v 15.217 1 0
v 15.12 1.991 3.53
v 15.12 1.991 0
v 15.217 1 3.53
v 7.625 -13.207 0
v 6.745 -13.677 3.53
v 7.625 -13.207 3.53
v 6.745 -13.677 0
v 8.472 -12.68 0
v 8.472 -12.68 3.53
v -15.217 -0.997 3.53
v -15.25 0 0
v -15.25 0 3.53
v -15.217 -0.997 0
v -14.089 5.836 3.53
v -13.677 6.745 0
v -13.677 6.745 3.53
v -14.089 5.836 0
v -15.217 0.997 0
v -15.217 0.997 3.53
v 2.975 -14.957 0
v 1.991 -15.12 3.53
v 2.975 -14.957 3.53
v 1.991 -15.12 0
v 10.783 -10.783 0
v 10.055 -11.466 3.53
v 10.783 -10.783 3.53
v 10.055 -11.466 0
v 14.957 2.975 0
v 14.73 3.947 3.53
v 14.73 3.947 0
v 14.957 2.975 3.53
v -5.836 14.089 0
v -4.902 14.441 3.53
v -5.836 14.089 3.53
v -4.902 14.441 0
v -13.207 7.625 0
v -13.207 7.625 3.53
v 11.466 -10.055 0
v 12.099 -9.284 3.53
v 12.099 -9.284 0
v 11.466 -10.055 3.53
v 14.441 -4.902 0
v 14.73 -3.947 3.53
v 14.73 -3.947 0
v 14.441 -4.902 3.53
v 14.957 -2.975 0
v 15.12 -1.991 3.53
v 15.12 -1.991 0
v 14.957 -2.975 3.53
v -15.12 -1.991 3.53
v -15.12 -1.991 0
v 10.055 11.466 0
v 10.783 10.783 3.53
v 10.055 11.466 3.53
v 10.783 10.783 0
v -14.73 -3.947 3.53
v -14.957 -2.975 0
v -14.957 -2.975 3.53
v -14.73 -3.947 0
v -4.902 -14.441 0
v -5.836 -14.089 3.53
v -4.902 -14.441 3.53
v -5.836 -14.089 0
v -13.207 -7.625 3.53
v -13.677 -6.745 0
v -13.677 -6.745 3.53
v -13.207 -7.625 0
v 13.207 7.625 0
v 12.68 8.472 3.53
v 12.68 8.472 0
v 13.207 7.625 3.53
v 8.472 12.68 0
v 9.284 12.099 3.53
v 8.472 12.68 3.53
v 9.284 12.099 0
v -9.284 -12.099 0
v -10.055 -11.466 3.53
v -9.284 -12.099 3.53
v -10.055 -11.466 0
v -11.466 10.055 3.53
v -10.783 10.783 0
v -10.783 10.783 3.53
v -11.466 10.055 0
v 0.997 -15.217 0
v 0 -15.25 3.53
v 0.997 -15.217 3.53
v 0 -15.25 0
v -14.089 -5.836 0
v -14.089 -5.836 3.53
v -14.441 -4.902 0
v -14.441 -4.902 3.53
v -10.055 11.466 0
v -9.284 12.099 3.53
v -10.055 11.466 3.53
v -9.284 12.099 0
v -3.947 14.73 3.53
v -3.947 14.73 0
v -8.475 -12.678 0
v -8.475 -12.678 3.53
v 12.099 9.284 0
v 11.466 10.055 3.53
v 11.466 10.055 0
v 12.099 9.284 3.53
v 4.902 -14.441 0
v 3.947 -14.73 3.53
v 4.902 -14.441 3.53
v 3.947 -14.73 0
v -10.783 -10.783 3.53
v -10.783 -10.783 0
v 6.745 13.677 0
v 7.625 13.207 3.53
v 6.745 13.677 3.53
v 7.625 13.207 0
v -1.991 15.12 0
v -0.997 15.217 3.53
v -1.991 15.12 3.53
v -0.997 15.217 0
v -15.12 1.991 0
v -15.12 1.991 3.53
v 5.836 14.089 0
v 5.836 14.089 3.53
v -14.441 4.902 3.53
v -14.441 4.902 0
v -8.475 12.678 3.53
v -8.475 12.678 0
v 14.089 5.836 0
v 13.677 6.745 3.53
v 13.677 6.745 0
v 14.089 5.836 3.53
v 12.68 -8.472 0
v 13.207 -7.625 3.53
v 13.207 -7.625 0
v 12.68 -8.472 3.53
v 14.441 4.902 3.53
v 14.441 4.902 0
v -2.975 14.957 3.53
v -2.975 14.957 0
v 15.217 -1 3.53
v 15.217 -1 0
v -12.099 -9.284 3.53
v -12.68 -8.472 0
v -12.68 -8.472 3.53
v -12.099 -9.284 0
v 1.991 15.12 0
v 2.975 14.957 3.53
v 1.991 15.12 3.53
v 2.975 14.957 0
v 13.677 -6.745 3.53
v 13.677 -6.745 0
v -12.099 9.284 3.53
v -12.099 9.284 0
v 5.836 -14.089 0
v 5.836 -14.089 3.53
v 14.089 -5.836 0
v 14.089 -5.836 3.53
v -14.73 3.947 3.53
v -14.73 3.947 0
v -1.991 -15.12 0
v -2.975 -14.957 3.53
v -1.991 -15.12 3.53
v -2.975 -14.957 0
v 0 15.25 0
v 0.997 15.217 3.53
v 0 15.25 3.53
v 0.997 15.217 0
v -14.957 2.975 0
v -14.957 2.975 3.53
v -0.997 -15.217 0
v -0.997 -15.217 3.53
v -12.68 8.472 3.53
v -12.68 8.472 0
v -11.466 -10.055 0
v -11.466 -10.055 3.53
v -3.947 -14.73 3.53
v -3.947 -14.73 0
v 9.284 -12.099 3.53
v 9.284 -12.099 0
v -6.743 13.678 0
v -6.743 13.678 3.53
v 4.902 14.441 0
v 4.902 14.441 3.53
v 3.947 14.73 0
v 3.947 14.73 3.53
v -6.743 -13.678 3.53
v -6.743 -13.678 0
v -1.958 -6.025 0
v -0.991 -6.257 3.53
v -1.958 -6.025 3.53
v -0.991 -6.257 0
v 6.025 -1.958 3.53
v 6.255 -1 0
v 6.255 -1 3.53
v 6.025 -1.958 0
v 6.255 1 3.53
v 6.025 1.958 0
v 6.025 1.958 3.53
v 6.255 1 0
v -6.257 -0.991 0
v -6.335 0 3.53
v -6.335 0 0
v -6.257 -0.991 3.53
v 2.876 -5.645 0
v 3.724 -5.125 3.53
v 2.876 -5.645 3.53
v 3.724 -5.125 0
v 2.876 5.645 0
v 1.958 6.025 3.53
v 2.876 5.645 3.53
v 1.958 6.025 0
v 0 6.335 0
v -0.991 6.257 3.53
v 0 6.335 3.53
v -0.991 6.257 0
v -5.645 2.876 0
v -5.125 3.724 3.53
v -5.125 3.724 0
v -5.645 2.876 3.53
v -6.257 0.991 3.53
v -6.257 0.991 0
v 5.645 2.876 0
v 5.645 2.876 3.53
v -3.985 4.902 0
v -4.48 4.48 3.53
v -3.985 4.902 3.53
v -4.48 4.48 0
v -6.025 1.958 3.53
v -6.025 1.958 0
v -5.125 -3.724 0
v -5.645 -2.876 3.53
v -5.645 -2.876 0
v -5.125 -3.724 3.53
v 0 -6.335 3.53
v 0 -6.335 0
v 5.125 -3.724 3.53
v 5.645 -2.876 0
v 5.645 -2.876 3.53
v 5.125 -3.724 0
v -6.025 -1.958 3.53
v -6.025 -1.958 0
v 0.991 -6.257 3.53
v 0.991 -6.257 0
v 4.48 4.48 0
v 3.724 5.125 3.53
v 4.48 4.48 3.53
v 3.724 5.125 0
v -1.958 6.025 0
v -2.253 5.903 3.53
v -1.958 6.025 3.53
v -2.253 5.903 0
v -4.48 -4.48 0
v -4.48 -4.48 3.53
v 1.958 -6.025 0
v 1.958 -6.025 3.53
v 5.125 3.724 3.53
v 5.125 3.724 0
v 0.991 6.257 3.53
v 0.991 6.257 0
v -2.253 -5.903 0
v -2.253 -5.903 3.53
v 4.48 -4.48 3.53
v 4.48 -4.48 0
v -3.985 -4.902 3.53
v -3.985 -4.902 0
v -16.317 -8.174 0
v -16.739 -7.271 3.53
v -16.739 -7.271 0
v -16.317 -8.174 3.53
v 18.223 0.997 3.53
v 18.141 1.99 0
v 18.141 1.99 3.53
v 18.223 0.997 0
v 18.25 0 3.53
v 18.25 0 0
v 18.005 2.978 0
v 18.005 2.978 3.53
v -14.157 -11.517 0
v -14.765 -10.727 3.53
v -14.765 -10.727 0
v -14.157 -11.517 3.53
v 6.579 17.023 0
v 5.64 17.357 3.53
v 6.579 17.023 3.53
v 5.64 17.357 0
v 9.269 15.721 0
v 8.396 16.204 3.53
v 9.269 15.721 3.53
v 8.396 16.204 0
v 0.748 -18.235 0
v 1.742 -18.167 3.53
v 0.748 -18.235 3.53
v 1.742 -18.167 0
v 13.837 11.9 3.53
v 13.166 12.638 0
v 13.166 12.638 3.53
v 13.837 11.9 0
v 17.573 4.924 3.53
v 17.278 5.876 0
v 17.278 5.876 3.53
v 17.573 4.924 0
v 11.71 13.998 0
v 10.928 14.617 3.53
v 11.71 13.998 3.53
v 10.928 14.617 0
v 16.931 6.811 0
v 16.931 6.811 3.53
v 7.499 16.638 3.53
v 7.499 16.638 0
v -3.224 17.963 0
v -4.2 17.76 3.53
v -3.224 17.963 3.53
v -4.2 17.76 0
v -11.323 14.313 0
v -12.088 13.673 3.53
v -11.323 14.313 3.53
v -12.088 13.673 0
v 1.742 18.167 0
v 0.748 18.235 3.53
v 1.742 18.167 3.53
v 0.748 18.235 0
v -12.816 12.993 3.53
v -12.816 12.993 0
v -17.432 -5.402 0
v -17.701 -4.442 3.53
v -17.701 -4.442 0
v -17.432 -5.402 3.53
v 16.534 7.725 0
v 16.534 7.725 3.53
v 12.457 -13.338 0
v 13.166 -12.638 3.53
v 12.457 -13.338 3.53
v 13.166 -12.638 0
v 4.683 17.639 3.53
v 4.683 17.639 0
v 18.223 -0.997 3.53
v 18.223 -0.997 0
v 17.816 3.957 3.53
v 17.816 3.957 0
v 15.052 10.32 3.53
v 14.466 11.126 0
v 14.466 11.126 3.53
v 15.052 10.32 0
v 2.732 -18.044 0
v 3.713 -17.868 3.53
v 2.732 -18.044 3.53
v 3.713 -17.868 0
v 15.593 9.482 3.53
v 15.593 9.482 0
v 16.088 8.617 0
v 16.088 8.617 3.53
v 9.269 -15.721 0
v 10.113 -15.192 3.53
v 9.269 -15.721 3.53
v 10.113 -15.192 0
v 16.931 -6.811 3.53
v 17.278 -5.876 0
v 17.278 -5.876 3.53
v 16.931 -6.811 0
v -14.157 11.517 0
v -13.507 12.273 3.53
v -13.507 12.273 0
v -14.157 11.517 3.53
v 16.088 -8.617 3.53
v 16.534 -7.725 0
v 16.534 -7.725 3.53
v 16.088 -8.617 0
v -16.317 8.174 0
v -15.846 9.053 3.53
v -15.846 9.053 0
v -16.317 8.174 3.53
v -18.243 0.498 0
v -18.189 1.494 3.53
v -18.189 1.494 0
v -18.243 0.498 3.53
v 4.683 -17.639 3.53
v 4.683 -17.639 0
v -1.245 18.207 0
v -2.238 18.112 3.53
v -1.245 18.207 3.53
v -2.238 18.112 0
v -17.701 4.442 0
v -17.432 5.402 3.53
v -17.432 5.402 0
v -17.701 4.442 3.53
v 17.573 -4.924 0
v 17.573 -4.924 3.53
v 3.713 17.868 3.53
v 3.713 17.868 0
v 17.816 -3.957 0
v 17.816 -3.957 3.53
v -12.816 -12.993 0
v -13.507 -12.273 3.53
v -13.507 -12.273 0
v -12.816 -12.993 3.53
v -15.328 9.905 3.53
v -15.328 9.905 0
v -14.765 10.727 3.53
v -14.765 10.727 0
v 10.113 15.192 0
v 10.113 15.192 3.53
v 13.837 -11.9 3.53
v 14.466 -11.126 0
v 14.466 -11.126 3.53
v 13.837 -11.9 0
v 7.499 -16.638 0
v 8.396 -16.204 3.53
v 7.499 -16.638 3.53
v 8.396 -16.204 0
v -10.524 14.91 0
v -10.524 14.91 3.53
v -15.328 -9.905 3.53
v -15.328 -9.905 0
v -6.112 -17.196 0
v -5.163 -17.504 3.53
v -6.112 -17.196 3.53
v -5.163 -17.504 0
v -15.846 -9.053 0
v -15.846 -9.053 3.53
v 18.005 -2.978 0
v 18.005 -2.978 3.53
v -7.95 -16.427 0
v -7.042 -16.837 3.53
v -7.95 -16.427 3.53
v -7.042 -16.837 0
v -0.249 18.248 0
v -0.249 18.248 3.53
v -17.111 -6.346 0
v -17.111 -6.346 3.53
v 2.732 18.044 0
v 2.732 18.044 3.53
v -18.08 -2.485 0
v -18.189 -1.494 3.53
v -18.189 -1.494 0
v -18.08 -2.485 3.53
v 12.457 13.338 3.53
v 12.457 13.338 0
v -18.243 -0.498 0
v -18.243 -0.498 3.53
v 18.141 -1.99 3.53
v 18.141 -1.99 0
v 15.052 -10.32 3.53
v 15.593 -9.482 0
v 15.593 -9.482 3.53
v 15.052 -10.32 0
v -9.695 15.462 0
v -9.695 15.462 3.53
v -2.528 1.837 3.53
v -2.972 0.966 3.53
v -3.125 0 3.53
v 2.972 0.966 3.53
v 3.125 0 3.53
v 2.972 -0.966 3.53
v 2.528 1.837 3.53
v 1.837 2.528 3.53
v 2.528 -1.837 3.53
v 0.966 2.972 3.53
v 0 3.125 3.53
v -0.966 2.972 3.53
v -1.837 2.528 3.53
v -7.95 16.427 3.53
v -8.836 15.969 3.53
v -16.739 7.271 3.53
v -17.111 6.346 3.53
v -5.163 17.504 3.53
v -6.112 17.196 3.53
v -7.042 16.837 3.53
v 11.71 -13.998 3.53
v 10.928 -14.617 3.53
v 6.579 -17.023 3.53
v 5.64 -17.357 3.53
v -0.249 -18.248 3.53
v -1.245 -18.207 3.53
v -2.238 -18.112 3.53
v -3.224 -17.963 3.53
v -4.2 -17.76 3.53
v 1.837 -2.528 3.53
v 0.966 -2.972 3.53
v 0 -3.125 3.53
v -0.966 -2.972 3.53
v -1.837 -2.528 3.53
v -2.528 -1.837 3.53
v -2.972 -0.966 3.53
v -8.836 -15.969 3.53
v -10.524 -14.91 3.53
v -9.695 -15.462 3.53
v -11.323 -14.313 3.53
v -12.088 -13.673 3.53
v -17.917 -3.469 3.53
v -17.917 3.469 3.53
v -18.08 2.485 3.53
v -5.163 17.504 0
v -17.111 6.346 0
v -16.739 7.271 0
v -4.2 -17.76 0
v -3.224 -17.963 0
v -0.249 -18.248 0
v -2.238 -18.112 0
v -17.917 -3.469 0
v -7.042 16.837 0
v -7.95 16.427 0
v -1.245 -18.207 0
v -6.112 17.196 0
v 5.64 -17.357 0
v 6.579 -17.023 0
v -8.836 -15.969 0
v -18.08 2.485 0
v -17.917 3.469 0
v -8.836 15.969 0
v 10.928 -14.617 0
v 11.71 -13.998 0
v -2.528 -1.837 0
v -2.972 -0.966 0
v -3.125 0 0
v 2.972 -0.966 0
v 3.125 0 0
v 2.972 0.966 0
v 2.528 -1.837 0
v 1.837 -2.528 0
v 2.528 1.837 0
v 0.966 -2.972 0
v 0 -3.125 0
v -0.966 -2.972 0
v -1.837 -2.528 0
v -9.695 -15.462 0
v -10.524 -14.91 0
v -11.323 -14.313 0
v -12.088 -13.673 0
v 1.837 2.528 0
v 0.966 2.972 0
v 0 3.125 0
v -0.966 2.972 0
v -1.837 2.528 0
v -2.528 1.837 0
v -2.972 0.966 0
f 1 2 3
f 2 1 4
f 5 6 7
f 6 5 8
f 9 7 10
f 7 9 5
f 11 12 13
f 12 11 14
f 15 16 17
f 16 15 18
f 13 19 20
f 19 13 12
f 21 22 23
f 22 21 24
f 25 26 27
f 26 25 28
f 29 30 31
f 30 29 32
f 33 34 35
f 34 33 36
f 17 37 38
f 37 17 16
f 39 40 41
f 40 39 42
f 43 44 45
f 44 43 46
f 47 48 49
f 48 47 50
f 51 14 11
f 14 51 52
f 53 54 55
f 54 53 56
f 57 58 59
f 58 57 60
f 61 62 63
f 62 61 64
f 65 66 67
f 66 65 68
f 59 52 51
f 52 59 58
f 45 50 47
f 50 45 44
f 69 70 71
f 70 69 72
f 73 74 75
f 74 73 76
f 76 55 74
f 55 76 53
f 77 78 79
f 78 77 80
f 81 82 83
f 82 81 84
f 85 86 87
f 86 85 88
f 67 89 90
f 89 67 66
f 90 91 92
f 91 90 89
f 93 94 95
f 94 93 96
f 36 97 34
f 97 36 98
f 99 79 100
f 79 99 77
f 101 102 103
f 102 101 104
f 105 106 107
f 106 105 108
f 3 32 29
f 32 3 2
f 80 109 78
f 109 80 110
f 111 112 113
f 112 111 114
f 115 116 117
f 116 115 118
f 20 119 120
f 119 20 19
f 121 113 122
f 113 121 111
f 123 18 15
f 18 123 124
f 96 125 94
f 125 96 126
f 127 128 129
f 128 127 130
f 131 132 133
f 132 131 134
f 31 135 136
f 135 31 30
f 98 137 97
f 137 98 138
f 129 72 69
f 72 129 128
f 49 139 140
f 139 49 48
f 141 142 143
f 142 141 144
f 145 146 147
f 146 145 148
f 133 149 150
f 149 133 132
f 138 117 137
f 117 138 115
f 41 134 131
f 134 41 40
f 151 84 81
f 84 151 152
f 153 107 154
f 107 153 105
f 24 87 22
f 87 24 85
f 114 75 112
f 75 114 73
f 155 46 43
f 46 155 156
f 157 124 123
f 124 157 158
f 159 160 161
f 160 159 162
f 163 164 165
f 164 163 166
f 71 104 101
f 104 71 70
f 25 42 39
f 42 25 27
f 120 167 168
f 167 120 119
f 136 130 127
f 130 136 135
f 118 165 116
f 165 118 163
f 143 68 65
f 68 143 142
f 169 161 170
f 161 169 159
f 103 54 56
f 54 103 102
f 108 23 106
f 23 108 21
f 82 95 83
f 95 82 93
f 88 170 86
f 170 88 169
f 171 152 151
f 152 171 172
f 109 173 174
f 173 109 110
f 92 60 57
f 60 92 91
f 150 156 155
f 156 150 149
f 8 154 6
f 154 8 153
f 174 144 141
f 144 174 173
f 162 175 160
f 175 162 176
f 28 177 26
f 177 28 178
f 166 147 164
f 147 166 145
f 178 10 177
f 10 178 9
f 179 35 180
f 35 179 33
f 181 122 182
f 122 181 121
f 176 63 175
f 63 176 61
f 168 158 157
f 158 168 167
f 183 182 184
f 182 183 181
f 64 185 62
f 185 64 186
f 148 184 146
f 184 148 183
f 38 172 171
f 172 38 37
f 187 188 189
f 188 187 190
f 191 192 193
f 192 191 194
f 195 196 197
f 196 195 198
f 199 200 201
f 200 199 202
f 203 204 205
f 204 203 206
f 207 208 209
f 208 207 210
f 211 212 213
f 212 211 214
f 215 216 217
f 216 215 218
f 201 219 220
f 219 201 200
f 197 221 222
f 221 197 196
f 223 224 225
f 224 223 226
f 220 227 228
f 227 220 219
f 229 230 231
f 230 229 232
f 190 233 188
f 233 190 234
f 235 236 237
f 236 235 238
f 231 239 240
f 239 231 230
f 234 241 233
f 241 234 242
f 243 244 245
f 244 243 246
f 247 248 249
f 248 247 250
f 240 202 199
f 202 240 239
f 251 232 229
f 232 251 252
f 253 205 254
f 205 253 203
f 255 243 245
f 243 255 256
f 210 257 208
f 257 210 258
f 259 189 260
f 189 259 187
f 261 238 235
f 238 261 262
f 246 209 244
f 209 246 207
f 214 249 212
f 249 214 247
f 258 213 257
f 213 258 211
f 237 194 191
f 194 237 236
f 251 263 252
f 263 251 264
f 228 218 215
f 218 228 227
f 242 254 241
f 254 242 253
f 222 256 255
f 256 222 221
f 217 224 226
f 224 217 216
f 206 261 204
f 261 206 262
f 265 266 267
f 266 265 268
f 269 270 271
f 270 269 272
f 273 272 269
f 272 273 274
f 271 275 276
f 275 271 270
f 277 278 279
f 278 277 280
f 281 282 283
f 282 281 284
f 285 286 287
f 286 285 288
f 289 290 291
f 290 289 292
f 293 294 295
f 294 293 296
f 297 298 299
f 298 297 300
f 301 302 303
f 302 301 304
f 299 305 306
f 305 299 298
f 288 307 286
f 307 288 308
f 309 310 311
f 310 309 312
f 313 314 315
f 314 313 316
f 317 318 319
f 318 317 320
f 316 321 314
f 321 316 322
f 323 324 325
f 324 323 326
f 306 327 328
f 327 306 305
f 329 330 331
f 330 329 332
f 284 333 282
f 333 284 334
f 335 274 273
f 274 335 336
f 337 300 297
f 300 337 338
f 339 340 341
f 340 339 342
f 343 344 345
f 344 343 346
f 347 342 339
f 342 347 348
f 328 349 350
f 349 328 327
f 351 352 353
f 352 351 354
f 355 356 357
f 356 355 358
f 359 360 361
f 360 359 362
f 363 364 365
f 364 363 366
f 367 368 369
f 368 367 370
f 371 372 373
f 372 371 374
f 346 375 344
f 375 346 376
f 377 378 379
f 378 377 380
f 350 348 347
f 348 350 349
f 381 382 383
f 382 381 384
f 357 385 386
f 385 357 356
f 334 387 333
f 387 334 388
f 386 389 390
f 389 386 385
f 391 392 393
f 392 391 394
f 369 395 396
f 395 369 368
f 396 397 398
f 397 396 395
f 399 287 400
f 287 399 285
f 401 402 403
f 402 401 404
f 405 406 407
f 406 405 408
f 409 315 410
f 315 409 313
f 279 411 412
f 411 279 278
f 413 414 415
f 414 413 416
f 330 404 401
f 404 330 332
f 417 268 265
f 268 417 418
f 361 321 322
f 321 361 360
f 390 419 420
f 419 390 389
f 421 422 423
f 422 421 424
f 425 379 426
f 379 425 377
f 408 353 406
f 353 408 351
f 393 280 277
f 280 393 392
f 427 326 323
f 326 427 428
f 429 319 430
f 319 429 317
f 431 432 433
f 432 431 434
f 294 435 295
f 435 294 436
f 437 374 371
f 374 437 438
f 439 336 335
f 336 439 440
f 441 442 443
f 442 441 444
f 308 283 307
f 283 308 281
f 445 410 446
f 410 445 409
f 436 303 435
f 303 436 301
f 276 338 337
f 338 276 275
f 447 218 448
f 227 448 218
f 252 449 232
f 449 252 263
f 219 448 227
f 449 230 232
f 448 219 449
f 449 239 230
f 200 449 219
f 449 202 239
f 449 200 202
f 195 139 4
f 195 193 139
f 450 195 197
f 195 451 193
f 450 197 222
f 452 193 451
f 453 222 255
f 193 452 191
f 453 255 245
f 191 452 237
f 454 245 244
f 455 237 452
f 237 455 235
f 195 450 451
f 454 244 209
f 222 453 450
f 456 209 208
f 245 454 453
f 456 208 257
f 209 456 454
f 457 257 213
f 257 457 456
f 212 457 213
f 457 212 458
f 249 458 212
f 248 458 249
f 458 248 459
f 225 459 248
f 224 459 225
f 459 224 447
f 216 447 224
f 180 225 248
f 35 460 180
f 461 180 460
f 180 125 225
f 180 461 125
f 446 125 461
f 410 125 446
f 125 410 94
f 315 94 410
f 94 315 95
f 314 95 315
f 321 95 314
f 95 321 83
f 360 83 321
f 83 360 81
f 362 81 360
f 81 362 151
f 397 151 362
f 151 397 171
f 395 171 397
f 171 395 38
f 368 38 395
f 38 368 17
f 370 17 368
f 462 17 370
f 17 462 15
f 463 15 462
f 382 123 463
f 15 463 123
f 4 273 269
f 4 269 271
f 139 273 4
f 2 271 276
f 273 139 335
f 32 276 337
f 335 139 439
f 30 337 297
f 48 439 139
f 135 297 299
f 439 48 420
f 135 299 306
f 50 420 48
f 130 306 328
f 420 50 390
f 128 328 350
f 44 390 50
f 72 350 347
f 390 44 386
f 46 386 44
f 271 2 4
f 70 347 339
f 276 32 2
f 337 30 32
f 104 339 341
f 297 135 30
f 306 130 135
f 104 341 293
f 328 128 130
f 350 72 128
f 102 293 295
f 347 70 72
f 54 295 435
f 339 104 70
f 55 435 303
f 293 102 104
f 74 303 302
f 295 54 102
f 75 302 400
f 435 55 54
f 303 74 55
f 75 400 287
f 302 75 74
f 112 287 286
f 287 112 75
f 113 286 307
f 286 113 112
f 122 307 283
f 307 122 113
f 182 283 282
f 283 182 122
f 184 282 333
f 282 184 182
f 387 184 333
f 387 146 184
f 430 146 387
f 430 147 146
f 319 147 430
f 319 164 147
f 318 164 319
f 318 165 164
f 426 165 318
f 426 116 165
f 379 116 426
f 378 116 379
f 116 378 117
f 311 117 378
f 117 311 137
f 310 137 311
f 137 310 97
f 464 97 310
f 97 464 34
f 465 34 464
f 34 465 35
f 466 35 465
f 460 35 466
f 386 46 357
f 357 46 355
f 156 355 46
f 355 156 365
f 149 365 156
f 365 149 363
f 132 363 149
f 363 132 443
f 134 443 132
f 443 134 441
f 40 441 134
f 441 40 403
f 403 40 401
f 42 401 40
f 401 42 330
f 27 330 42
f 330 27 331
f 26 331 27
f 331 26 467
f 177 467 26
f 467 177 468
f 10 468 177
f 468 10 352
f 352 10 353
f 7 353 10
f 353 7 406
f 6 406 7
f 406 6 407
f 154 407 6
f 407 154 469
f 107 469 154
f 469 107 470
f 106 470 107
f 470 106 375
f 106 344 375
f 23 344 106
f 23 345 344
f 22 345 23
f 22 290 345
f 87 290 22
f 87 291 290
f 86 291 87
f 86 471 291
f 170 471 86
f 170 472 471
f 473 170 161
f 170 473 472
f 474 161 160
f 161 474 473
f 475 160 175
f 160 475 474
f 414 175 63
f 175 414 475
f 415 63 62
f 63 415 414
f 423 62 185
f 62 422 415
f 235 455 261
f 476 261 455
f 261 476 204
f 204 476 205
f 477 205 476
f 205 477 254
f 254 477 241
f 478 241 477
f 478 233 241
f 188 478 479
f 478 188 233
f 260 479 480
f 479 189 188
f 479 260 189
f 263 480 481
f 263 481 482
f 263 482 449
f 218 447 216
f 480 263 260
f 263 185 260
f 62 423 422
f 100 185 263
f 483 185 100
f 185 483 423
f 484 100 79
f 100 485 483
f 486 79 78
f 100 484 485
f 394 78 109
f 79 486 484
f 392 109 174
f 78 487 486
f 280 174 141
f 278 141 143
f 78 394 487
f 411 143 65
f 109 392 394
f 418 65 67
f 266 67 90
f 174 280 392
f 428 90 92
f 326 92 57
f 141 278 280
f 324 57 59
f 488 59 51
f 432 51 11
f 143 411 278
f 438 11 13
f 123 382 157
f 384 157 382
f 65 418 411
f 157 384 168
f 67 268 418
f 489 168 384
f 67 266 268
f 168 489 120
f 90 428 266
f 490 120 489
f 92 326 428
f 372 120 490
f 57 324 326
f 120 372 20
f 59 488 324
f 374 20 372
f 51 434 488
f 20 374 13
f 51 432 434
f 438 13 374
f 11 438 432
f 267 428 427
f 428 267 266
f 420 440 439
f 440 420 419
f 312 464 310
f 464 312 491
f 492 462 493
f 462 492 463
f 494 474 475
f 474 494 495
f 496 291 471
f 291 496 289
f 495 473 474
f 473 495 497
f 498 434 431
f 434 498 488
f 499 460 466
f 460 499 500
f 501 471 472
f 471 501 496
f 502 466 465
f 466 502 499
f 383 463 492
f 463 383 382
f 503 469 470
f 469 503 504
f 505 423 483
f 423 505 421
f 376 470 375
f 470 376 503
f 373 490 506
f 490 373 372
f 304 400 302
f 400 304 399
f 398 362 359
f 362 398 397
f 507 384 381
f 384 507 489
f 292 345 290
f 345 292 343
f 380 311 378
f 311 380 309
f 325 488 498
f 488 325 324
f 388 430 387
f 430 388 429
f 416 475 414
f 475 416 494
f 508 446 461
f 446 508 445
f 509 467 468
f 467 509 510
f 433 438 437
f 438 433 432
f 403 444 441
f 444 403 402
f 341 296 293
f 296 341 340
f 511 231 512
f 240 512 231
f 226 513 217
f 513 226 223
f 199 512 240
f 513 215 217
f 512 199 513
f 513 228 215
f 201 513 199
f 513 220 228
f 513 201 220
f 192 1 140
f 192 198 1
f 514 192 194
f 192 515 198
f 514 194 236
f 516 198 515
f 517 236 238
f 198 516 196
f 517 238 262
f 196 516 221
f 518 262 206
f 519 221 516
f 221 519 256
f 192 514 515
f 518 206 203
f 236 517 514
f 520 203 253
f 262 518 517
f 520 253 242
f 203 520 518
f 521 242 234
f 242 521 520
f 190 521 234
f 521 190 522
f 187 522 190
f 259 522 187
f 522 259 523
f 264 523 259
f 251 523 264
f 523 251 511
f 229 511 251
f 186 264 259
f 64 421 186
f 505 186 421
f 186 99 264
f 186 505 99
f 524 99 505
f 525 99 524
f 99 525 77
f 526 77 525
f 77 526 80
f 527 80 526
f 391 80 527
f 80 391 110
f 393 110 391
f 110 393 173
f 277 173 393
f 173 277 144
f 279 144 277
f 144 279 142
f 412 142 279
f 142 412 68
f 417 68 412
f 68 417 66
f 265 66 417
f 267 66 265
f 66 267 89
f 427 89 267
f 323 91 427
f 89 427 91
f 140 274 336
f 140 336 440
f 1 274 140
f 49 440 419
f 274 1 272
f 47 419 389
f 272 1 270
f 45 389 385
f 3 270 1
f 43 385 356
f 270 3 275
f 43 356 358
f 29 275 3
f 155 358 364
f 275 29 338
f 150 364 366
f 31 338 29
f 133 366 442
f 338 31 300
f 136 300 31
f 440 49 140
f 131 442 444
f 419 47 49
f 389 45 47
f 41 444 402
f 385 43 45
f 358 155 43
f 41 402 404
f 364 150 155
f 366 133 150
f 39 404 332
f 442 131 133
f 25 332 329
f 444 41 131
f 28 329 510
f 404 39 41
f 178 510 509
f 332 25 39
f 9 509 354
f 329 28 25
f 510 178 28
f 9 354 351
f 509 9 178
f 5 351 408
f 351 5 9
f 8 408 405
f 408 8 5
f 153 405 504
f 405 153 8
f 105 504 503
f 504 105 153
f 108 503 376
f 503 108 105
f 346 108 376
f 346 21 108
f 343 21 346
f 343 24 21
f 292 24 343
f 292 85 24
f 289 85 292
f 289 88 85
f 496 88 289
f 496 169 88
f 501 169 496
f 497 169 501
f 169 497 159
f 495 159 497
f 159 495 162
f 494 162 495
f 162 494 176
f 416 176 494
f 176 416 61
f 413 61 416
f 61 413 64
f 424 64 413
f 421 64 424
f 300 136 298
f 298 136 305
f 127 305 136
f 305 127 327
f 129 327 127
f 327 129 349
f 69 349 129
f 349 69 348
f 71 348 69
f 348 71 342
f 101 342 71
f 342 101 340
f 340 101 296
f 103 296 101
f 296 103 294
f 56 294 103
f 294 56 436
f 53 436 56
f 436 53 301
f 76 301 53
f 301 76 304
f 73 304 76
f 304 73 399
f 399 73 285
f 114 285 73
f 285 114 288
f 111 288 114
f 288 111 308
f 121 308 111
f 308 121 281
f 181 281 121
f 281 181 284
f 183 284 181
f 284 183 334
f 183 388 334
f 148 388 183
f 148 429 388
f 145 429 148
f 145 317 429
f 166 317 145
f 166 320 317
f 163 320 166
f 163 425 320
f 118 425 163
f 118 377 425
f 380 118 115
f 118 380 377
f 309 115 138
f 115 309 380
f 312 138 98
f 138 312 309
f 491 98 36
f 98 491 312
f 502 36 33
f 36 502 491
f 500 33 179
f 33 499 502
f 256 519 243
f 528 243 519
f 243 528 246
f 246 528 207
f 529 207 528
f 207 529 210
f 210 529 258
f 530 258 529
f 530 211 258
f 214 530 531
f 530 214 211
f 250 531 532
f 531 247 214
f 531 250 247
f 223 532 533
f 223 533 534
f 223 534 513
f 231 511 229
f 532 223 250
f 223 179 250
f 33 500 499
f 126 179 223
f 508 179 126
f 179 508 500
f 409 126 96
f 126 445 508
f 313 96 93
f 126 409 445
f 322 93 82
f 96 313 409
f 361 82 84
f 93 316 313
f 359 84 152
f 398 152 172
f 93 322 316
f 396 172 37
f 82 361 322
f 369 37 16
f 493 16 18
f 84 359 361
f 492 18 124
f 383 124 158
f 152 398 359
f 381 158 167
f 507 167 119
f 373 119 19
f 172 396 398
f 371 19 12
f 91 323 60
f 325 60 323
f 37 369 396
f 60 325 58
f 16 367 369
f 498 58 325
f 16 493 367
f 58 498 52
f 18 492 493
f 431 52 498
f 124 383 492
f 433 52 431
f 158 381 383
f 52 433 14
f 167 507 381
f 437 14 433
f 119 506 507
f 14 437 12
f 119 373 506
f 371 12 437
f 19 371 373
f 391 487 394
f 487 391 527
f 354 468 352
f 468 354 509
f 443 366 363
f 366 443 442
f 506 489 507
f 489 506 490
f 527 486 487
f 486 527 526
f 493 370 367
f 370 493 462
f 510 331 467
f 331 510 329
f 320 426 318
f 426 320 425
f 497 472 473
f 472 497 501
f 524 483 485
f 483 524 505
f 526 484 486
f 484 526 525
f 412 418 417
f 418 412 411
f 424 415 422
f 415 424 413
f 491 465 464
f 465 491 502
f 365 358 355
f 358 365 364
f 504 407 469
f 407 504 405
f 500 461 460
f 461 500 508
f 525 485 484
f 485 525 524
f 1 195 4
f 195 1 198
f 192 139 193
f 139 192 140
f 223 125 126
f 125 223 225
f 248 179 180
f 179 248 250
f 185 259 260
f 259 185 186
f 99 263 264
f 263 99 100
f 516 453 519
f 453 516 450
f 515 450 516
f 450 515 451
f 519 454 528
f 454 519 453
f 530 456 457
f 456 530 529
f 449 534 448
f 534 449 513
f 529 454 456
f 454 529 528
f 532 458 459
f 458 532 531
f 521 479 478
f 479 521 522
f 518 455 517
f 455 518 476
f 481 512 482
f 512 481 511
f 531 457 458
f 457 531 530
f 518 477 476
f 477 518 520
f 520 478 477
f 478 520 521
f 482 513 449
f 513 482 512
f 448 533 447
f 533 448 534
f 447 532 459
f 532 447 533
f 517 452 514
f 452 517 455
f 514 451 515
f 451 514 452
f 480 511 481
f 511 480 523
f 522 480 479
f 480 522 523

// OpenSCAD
// M-94 Cipher Device Model
//
// Version 0.2
// All dimensions in mm.
// by Mike Koss, 2013
// License: CC-Attribution.

use <write.scad>

// When true - copies details from the authentic M-94
REPLICA = false;
WHEEL = 17;

// Epsilon - to ensure walls not coincident
E = 0.01;

wheels = ["ABCEIGDJFVUYMHTQKZOLRXSPWN",
          "ACDEHFIJKTLMOUVYGZNPQXRWSB",
          "ADKOMJUBGEPHSCZINXFYQRTVWL",
          "AEDCBIFGJHLKMRUOQVPTNWYXZS",
          "AFNQUKDOPITJBRHCYSLWEMZVXG",
          "AGPOCIXLURNDYZHWBJSQFKVMET",
          "AHXJEZBNIKPVROGSYDULCFMQTW",
          "AIHPJOBWKCVFZLQERYNSUMGTDX",
          "AJDSKQOIVTZEFHGYUNLPMBXWCR",
          "AKELBDFJGHONMTPRQSVZUXYWIC",
          "ALTMSXVQPNOHUWDIZYCGKRFBEJ",
          "AMNFLHQGCUJTBYPZKXISRDVEWO",
          "ANCJILDHBMKGXUZTSWQYVORPFE",
          "AODWPKJVIUQHZCTXBLEGNYRSMF",
          "APBVHIYKSGUENTCXOWFQDRLJZM",
          "AQJNUBTGIMWZRVLXCSHDEOKFPY",
          "ARMYOFTHEUSZJXDPCWGQIBKLNV",
          "ASDMCNEQBOZPLGVJRKYTFUIWXH",
          "ATOJYLFXNGWHVCMIRBSEKUPDZQ",
          "AUTRZXQLYIOVBPESNHJWMDGFCK",
          "AVNKHRGOXEYBFSJMUDQCLZWTIP",
          "AWVSFDLIEBHKNRJQZGMXPUCOTY",
          "AXKWREVDTUFOYHMLSIQNJCPGBZ",
          "AYJPXMVKBQWUGLOSTECHNZFRID",
          "AZDNBUHYFWJLVGRCQMPSOEXTKI"
         ];

// Disk dimensions
OD = 36.5;
WALL_WIDTH = REPLICA ? 1.0 : 3.0;
R_O = OD / 2;
R_I = R_O - WALL_WIDTH;
H = 3.53;
T = 1.0;

LETTER_SIZE = 3.75;
LETTER_SHIFT = -0.10;

// Axle dimensions
A = 6.15;
ID_A = A + 0.1;
OD_A = 12.67;
R_A = OD_A / 2;

// Sprocket dimensions
R_S = R_O - 1.0;
R_S2 = R_S - 2.8;
R_S3 = R_S - 5.2;
H_S = 1.0;

// Sprocket and peg width
W_S = 2.46;
W_P = 1.00;
L_P = 2.00;
H_P = H - 0.5;

// Alignment bar dimensions
B_W = 6.5;
B_H = 4.4;
B_H2 = 2.3;

// M-94 has a set of interlocking sprockets that engage a peg on the
// underside of the wheel to the left.
module sprockets() {
  union() {
    // Ring
    difference() {
      cylinder(h=H_S, r=R_S2, $fa=1, $fs=1);
      translate([0, 0, -H_S/2])
        cylinder(h=H_S * 2, r1=R_S3 - 1.0, r2=R_S3, $fa=1, $fs=1);
    }

    // Sprockets
    for (i = [0 : 25]) {
      rotate(a=360 * i / 26, v=[0, 0, 1])
        translate([R_S3, -W_S / 2, 0])
        cube([R_S - R_S3, W_S, H_S]);
    }

    // Peg
    rotate(a=360/26/2, v=[0, 0, 1])
      translate([R_I - L_P, -W_P / 2, -H_P])
      cube([L_P, W_P, H_P]);
  }
}

module spokes(n) {
  for (i = [0 : n -1]) {
    rotate(a=360 * i / n, v=[0, 0, 1])
      translate([R_A - 1, -1, 0])
      cube([R_I - R_A + 2, 2, H]);
  }
}

module basicDisk() {
  difference() {
    cylinder(h=H, r=R_O, $fa=1, $fs=1);

    if (REPLICA) {
      translate([0, 0, -T]) difference () {
        cylinder(h=H, r=R_I, $fa=1, $fs=1);
        cylinder(h=H, r=R_A, $fa=1, $fs=1);
      }
    } else {
      translate([0, 0, -H/2]) scale([1, 1, 2]) difference () {
        cylinder(h=H, r=R_I, $fa=1, $fs=1);
        cylinder(h=H, r=R_A, $fa=1, $fs=1);
      }
    }
  }
  if (!REPLICA) {
    spokes(3);
  }
}

module disk(letters) {
  union() {
    difference() {
      basicDisk();

      // Axle hole
      translate([0, 0, -H/2]) scale([1, 1, 2])
        cylinder(h=H, r=ID_A / 2, $fa=1, $fs=1);

      // Etched letters
      alpha(letters);
    }

    translate([0, 0, H])
      if (REPLICA) {
        sprockets();
      }
  }
}

module alpha(letters) {
  for (i = [0 : len(letters) - 1]) {
    rotate(a=360 * (1 - i / 26), v=[0, 0, 1])
      translate([R_I + WALL_WIDTH / 2 + 1.0, 0, H / 2 + LETTER_SHIFT])
      rotate(a=90, v=[0, 1, 0])
      write(letters[i], h=LETTER_SIZE, t=WALL_WIDTH, center=true, font="Letters.dxf");
  }
}

// Wheel 1 through 25
module wheel(i) {
  if (i == 0) {
    bar();
  } else {
    disk(wheels[i - 1]);
  }
}

// Alignment bar
module bar() {
  disk("");
  translate([R_O - .25, 0, H])
    rotate(a=90, v=[0, 1, 0])
    difference() {
      polyhedron(
        points=[ [0, -B_W / 2, 0], [0, 0, B_H], [0, B_W / 2, 0],
                 [26 * H, -B_W / 2, 0], [26 * H, 0, B_H2], [26 * H, B_W / 2, 0]
               ],
        triangles=[ [0, 2, 1],
                    [0, 1, 4], [4, 3, 0],
                    [3, 4, 5],
                    [5, 4, 1], [1, 2, 5],
                    [0, 3, 5], [5, 2, 0] ]
      );
      union() {
        for (i = [1 : 4]) {
          translate([(5 * i + 1) * H, B_W / 2 - 1, -B_H])
            cube([0.5, 2, 2 * B_H]);
        }
      }
    }
}

// Render the "special" wheel as a sample.
wheel(WHEEL);
